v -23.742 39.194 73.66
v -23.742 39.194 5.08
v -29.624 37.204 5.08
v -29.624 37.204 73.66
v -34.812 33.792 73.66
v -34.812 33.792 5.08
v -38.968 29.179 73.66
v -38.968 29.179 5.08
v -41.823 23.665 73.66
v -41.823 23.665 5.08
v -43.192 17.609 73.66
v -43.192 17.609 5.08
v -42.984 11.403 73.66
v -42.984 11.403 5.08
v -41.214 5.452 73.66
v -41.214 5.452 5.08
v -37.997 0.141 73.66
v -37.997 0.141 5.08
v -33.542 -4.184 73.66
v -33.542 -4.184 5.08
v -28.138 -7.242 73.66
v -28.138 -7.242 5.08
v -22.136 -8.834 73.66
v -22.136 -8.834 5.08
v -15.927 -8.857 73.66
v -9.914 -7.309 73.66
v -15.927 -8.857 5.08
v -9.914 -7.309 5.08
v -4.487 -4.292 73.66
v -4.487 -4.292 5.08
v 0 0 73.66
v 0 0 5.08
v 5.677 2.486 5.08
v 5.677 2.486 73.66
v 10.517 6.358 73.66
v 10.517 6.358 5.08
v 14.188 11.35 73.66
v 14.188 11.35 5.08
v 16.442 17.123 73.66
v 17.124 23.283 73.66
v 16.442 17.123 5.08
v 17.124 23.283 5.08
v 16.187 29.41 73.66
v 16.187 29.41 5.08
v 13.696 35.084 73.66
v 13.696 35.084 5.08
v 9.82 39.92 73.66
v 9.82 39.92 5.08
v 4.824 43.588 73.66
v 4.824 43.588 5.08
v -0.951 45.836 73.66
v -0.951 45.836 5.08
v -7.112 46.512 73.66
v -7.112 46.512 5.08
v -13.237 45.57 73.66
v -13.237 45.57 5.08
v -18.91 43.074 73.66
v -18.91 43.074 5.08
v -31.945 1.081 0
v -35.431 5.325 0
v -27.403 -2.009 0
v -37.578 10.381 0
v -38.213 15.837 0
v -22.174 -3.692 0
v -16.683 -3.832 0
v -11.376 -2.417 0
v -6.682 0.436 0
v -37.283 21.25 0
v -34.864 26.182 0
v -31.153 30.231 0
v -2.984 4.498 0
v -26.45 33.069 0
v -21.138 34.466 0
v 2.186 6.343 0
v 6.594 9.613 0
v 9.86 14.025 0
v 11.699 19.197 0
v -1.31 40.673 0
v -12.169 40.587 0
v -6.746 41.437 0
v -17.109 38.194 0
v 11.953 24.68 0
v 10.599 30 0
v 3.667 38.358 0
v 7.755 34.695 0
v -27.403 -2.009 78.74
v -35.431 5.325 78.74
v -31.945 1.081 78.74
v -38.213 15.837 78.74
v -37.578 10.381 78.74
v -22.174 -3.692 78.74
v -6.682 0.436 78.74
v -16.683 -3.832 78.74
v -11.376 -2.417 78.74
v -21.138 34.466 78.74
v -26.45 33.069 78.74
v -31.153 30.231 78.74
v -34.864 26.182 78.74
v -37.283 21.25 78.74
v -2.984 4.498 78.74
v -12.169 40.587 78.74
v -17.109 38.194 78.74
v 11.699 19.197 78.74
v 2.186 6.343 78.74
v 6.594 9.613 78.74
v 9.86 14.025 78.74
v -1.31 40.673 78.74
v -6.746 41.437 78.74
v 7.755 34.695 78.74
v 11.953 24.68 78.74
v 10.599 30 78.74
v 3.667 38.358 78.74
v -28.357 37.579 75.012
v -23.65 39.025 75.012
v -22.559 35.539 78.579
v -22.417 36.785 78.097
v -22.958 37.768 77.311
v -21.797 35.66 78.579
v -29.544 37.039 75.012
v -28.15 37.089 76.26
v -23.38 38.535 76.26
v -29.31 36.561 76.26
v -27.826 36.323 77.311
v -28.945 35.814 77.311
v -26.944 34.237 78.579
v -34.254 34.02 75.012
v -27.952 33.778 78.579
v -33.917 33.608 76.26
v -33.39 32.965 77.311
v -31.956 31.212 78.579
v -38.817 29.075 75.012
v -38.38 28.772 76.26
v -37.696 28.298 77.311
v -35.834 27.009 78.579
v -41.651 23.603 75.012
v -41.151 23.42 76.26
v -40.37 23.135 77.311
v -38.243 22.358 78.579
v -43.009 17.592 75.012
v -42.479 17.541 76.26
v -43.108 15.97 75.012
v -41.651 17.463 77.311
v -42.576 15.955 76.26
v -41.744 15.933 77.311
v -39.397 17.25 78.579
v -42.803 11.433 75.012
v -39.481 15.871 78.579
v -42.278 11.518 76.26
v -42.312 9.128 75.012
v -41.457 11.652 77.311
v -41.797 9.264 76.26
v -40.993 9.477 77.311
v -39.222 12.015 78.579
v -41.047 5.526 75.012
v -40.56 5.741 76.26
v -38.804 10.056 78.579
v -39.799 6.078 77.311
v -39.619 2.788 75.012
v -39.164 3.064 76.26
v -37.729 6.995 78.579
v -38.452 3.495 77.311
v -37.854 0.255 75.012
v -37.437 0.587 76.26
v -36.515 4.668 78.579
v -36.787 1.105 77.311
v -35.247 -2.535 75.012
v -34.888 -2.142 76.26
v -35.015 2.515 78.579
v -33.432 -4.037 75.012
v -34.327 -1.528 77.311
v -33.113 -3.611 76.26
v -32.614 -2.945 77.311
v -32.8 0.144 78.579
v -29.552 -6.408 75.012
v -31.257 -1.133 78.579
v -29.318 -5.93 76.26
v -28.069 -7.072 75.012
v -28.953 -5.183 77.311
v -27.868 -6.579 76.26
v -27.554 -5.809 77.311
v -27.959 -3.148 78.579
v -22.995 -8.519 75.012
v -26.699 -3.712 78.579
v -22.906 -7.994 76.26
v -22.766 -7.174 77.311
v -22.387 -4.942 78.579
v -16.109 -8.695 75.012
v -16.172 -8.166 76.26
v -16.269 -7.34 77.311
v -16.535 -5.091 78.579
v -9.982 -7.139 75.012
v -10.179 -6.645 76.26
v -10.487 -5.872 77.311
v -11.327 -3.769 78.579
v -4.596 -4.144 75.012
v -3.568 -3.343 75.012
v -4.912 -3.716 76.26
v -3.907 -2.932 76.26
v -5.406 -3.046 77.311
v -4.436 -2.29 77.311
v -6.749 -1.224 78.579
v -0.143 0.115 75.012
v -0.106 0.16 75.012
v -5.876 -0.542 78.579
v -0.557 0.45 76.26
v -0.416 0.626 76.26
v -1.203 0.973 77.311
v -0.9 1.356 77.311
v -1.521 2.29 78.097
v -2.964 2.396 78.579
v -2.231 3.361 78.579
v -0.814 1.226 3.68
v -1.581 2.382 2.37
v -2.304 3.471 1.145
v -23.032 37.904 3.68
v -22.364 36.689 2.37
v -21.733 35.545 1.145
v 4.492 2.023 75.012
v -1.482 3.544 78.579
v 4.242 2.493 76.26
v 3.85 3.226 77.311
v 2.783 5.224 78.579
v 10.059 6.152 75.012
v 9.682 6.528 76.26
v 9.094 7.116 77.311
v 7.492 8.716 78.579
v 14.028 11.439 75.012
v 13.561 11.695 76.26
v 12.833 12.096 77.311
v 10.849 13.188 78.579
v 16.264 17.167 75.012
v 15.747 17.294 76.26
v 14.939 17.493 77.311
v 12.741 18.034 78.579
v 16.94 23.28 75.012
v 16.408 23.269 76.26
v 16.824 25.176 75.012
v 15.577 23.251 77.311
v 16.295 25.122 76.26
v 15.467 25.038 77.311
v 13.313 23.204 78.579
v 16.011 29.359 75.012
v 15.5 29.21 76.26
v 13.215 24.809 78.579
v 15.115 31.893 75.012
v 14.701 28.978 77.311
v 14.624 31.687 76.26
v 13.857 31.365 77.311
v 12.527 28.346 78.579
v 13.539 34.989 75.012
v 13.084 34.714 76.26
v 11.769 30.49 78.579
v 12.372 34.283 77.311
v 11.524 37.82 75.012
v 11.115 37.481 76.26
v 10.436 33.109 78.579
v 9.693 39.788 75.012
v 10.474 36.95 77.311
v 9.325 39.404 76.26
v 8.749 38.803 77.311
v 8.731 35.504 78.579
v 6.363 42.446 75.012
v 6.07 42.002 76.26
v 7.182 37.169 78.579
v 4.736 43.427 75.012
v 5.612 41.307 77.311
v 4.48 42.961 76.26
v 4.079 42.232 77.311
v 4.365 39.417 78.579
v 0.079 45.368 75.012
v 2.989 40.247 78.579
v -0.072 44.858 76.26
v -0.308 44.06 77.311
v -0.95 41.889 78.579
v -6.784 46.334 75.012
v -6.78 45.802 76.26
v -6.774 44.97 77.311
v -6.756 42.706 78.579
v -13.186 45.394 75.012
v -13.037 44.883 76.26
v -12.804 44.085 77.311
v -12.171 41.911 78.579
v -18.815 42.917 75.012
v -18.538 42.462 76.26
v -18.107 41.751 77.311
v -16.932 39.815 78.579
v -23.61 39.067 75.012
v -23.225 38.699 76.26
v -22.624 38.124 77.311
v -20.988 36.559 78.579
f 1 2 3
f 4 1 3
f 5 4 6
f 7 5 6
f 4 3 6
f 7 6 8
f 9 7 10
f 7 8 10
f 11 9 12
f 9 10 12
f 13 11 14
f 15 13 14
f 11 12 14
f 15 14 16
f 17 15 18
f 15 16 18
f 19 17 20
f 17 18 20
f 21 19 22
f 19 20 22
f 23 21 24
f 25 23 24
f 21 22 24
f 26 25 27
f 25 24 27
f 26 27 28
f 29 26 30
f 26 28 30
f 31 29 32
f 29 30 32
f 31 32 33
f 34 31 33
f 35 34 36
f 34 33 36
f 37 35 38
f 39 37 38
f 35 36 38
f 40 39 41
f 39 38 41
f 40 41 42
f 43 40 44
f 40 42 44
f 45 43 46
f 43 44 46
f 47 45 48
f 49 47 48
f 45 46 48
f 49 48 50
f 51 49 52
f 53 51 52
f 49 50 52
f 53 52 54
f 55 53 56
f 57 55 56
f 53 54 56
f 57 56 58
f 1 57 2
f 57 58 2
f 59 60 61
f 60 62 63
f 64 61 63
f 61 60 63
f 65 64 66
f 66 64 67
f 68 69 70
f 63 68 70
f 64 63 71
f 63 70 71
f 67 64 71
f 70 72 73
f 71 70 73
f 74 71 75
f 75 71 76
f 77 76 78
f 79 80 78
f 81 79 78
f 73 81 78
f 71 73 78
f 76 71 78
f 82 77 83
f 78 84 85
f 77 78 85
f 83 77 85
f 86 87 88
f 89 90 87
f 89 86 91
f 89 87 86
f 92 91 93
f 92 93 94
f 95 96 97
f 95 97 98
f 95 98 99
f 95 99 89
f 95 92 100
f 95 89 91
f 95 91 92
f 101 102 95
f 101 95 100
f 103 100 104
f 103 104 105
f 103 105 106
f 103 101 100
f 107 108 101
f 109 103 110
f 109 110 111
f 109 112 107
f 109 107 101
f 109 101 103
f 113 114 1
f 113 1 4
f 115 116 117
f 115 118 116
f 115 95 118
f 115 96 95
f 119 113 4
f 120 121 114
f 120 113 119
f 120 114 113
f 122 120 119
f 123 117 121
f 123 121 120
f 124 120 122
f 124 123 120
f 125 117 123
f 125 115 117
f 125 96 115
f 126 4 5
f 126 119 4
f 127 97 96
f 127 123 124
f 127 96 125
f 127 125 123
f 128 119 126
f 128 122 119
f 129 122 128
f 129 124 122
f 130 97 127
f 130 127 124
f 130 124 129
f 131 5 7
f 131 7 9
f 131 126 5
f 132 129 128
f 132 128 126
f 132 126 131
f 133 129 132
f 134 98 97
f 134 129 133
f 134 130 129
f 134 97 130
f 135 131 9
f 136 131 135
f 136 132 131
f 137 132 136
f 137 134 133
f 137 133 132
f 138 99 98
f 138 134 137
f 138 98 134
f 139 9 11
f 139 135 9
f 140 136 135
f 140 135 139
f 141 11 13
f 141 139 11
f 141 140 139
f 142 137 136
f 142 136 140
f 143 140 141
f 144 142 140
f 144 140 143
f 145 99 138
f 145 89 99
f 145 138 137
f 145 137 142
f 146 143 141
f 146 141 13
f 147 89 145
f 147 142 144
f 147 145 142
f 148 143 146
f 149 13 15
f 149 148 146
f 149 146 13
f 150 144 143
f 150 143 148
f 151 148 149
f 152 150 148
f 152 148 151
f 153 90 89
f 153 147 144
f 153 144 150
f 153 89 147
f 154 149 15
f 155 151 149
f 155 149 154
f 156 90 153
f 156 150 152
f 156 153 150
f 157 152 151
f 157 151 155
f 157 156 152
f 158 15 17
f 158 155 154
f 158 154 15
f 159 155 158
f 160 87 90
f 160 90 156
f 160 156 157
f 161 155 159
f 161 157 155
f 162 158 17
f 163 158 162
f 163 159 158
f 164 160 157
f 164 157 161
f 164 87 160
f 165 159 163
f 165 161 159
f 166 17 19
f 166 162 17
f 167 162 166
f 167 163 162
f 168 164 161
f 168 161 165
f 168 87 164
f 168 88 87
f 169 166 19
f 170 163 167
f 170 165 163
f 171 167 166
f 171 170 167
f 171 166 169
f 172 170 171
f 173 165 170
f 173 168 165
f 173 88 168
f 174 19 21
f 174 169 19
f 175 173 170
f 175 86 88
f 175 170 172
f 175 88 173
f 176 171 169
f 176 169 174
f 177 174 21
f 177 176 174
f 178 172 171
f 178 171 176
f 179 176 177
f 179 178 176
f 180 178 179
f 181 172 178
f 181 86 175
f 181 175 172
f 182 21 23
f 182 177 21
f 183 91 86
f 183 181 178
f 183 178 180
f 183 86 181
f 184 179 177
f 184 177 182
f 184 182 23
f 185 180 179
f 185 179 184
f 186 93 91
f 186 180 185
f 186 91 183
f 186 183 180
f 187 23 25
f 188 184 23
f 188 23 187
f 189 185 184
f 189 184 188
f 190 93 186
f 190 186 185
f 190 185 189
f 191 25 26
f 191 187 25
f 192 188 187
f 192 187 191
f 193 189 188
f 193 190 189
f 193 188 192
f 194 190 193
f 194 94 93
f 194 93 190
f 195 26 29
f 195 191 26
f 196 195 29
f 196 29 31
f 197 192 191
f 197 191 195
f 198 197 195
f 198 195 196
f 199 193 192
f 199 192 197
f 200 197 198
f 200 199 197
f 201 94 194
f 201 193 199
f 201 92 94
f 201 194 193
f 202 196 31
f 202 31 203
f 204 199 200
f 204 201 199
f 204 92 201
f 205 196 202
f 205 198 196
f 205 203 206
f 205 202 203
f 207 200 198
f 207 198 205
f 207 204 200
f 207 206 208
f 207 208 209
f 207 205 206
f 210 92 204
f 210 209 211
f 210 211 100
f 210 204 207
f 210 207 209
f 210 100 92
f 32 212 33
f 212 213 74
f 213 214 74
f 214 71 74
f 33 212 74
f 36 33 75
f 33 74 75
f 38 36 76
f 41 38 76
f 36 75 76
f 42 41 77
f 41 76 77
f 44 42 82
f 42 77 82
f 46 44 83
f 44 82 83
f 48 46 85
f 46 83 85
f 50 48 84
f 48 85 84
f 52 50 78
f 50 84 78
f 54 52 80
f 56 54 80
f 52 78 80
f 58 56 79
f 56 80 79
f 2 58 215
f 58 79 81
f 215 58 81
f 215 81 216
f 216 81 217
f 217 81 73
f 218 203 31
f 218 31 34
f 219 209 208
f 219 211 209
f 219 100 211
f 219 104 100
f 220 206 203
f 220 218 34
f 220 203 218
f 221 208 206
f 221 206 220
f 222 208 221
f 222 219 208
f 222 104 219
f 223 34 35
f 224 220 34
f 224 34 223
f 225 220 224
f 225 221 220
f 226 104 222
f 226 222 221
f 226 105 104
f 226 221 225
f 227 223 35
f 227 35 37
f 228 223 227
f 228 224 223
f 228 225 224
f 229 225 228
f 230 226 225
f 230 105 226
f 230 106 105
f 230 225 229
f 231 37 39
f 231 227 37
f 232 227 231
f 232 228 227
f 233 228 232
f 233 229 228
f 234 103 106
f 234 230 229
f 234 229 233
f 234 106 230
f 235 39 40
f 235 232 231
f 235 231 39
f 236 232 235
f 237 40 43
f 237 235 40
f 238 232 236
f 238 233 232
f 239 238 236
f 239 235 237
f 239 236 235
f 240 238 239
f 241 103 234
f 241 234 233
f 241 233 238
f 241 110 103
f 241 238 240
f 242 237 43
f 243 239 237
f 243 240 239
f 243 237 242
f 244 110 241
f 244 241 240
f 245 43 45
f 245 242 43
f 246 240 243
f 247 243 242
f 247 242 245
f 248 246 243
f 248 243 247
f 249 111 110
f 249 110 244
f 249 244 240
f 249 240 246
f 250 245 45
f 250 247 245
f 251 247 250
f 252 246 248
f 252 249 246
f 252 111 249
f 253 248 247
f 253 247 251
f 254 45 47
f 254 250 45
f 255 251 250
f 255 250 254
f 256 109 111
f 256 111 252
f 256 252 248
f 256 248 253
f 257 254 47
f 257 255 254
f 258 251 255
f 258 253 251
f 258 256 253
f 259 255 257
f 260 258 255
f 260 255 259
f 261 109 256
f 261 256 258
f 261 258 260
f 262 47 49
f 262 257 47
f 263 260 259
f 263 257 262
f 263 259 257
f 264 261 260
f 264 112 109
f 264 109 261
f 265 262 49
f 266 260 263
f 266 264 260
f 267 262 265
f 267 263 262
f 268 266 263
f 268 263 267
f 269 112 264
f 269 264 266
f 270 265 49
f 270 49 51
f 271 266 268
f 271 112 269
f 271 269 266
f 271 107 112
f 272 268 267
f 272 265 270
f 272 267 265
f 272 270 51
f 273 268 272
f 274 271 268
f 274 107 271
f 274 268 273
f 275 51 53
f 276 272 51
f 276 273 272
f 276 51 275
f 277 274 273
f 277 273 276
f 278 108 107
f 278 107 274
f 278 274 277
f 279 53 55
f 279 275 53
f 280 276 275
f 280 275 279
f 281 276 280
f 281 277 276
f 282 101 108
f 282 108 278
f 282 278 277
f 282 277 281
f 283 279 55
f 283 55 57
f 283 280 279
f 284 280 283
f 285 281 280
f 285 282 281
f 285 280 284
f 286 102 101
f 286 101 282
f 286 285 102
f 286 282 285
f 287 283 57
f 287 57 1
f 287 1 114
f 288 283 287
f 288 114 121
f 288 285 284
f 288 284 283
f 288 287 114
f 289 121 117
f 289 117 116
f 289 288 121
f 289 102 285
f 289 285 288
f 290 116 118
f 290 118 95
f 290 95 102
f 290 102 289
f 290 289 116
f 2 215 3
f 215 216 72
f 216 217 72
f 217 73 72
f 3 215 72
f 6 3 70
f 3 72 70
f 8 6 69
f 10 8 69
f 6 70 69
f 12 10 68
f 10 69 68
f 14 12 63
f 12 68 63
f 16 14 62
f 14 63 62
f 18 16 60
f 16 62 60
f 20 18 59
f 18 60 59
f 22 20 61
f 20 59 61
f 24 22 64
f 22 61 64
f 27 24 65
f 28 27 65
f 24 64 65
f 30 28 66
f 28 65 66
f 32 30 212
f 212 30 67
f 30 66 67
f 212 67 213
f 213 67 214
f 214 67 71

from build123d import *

# Parameters (mm, degrees)
F1_DEPTH = 78.74
F2_R     = 5.08
F3_SIZE  = 5.08


with BuildPart() as f1:
    # F0 (on Top) → F1 (new body)
    with BuildSketch(Plane.XY):
        with BuildLine():
            ThreePointArc((-23.742214, 39.193708), (-39.775667, 2.693222), (0, 0))
            ThreePointArc((0, 0), (13.695812, 35.084423), (-23.742214, 39.193708))
        make_face()
    extrude(amount=F1_DEPTH)

    # F2
    f2_edges = [f1.edges().sort_by_distance(p)[0] for p in [
        (-39.775667, 2.693222, 78.74),
        (13.695812, 35.084423, 78.74),
    ]]
    fillet(f2_edges, radius=F2_R)

    # F3
    f3_edges = [f1.edges().sort_by_distance(p)[0] for p in [
        (-39.775667, 2.693222, 0),
        (13.695812, 35.084423, 0),
    ]]
    chamfer(f3_edges, length=F3_SIZE)


solid = f1.part
